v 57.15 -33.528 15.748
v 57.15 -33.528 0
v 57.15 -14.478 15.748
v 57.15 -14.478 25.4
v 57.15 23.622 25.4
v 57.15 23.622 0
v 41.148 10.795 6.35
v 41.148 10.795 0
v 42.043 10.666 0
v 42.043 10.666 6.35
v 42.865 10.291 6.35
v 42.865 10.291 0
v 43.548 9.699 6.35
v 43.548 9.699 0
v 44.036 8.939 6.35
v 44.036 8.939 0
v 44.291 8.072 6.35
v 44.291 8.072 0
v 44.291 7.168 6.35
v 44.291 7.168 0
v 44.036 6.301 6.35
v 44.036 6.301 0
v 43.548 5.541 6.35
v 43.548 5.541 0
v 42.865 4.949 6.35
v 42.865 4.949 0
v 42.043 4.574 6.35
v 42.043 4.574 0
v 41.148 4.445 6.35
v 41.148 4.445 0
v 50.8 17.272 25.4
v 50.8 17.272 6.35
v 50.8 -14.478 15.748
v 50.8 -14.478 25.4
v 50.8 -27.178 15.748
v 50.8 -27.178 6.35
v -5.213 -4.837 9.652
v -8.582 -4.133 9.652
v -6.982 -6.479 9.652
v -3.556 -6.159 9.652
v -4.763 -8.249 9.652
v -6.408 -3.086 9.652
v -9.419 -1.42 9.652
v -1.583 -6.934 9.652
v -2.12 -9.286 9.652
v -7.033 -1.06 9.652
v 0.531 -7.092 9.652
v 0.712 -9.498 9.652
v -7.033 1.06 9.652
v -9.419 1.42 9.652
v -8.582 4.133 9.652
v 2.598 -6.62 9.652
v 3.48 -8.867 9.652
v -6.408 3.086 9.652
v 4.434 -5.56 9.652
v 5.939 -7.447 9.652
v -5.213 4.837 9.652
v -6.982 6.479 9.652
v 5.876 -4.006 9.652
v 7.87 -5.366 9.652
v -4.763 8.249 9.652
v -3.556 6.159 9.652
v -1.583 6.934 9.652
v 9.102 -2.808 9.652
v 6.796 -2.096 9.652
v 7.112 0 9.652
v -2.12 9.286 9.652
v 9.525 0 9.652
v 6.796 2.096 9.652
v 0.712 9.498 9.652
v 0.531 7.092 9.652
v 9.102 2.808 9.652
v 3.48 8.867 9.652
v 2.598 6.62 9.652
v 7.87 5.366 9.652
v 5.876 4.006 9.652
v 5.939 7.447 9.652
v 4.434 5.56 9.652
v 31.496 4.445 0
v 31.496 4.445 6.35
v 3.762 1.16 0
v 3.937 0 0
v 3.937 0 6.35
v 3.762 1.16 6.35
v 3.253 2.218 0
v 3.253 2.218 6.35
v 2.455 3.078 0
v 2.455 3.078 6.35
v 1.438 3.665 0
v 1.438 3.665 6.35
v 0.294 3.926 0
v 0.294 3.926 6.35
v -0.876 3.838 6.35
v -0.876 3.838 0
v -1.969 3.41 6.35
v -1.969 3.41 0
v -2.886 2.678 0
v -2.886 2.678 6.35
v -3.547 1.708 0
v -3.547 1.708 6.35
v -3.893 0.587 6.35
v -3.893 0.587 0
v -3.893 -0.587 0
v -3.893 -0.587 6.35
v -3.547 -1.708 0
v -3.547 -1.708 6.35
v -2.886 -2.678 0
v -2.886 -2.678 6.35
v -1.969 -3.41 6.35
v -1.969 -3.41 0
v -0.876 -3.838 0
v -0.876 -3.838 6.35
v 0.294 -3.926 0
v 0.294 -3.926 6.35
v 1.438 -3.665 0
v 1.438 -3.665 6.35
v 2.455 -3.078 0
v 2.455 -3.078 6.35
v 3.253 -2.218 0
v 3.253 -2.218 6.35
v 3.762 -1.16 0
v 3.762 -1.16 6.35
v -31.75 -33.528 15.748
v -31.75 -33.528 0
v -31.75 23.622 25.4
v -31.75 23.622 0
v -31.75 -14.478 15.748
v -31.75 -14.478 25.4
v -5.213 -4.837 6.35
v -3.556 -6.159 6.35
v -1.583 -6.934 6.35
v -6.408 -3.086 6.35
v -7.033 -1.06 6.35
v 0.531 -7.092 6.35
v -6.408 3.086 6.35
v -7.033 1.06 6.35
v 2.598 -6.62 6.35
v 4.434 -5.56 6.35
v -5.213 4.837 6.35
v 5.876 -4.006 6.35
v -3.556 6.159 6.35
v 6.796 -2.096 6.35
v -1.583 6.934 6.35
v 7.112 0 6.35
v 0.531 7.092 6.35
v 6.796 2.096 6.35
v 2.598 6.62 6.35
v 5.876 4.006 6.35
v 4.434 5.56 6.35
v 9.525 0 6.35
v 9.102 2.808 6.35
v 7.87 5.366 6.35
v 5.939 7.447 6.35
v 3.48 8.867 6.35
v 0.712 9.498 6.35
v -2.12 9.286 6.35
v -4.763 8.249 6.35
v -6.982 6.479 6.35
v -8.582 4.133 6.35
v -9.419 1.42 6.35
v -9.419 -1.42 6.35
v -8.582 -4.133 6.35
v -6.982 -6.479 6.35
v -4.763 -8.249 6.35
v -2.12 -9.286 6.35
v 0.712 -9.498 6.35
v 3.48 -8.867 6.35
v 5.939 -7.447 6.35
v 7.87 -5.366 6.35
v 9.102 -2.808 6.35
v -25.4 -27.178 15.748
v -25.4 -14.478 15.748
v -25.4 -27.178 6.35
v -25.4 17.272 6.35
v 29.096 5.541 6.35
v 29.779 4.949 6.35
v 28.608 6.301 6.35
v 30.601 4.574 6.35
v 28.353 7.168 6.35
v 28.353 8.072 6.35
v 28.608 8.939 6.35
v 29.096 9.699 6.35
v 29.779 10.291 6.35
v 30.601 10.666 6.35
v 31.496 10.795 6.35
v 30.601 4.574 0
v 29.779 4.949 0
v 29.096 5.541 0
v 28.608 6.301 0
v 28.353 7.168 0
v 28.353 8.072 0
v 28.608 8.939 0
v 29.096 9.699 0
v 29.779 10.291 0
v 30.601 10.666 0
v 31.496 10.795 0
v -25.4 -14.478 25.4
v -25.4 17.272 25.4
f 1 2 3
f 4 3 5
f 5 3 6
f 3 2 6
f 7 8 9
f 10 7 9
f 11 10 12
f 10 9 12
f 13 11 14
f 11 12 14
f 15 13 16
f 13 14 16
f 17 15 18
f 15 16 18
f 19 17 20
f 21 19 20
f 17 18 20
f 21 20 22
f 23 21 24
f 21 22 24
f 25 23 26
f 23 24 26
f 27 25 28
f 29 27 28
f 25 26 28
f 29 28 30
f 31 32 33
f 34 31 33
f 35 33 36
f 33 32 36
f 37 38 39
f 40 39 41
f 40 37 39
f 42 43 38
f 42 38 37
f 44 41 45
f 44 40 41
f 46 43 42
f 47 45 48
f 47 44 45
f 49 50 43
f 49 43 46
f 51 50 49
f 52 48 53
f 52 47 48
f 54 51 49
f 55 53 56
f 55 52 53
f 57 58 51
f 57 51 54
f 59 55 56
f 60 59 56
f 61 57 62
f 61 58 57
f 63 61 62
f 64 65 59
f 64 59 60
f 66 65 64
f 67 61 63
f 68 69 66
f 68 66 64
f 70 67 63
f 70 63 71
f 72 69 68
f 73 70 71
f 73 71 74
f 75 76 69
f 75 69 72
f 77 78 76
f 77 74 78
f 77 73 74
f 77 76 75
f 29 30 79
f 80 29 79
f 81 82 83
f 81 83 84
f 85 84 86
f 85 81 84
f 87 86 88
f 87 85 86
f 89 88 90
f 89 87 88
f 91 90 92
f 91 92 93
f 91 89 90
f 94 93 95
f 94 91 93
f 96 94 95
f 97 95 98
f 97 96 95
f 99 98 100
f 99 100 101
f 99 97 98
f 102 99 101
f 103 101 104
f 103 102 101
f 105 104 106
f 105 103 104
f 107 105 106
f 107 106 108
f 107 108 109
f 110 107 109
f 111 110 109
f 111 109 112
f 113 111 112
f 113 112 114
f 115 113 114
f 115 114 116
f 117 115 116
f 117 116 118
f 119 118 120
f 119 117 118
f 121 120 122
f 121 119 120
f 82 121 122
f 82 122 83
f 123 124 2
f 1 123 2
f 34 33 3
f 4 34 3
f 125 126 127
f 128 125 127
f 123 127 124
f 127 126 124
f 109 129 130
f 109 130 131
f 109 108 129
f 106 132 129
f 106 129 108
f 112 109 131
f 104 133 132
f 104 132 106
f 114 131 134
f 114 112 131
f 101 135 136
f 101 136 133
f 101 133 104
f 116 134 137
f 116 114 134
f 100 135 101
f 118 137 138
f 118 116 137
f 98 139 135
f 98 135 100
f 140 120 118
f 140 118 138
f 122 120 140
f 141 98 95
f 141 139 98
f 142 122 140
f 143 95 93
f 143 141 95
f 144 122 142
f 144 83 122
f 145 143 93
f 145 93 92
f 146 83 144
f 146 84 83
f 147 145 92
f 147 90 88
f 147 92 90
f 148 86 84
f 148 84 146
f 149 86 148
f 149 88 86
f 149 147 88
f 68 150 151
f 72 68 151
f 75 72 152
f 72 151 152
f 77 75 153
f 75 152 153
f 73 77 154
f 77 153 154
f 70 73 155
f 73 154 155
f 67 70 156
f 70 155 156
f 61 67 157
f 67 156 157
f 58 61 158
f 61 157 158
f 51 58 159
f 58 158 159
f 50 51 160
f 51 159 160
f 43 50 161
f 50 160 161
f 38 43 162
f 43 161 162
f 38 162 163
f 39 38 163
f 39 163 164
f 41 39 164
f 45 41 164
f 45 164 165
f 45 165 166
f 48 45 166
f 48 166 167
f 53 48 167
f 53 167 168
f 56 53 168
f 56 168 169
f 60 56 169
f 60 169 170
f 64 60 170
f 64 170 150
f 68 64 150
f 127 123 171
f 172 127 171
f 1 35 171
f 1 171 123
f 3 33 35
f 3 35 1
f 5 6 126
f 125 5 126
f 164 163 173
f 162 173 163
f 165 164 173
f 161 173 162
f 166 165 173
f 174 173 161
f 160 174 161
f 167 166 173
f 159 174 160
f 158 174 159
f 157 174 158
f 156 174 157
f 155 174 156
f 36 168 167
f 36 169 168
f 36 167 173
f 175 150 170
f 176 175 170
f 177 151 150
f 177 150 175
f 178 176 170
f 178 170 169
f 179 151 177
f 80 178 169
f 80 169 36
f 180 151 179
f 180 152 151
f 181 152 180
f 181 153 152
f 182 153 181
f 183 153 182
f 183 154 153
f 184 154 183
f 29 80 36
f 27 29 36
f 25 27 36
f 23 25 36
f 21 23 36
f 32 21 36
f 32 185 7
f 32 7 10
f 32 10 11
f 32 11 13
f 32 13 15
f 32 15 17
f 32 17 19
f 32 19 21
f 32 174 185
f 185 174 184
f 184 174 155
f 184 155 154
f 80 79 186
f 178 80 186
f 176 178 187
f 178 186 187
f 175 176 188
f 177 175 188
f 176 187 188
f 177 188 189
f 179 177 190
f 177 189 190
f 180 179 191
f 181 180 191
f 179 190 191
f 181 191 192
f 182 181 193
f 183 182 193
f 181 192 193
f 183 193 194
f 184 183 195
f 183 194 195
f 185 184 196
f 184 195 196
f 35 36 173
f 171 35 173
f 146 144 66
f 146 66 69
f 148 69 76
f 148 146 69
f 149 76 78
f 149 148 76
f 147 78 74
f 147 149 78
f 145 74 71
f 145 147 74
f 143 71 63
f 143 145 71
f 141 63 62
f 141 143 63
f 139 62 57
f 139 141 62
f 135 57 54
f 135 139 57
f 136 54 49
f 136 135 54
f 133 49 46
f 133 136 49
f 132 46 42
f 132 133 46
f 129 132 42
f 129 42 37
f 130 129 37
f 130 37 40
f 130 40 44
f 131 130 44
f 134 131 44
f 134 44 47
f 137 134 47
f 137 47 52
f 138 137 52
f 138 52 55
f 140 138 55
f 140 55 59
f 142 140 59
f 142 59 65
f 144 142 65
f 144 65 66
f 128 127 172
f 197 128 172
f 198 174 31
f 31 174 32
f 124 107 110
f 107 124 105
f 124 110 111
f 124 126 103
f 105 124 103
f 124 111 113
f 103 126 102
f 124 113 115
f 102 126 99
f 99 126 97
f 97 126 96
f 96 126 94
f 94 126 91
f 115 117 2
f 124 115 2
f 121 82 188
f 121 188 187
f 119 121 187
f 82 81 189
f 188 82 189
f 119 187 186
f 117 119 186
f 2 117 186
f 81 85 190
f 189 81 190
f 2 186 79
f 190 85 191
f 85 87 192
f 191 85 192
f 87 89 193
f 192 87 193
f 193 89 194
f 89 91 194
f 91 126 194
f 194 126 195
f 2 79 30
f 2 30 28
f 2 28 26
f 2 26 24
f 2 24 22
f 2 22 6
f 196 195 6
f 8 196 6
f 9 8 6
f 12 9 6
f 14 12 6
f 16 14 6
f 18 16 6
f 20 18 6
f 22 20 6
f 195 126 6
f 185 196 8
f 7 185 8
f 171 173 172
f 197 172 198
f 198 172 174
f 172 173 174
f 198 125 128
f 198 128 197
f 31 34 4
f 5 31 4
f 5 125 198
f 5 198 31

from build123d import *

# Parameters (mm, degrees)
F1_DEPTH = 25.4
F2_DEPTH = 15.748
F0_R     = 9.525
F3_DEPTH = 6.35
F0_R_2   = 7.112
F4_DEPTH = 9.652
F0_R_3   = 3.937
F5_DEPTH = 6.35


with BuildPart() as f1:
    # F0 (on Top) → F1 (new body)
    with BuildSketch(Plane.XY):
        Polygon((57.15, 23.622), (-31.75, 23.622), (-31.75, -14.478), (-25.4, -14.478), (-25.4, 17.272), (50.8, 17.272), (50.8, -14.478), (57.15, -14.478), align=None)
    extrude(amount=F1_DEPTH)

    # F0 (on Top) → F2 (join)
    with BuildSketch(Plane.XY):
        Polygon((-25.4, -14.478), (-31.75, -14.478), (-31.75, -33.528), (57.15, -33.528), (57.15, -14.478), (50.8, -14.478), (50.8, -27.178), (-25.4, -27.178), align=None)
    extrude(amount=F2_DEPTH)

    # F0 (on Top) → F3 (join)
    with BuildSketch(Plane.XY):
        Polygon((-25.4, 17.272), (-25.4, -14.478), (-25.4, -27.178), (50.8, -27.178), (50.8, -14.478), (50.8, 17.272), align=None)
        Circle(F0_R, mode=Mode.SUBTRACT)
        with BuildLine():
            ThreePointArc((31.496, 4.445), (28.321, 7.62), (31.496, 10.795))
            Line((31.496, 10.795), (41.148, 10.795))
            ThreePointArc((41.148, 10.795), (44.323, 7.62), (41.148, 4.445))
            Line((41.148, 4.445), (31.496, 4.445))
        make_face(mode=Mode.SUBTRACT)
    extrude(amount=F3_DEPTH)

    # F0 (on Top) → F4 (join)
    with BuildSketch(Plane.XY):
        Circle(F0_R)
        Circle(F0_R_2, mode=Mode.SUBTRACT)
    extrude(amount=F4_DEPTH)

    # F0 (on Top) → F5 (join)
    with BuildSketch(Plane.XY):
        Circle(F0_R_2)
        Circle(F0_R_3, mode=Mode.SUBTRACT)
    extrude(amount=F5_DEPTH)


solid = f1.part
